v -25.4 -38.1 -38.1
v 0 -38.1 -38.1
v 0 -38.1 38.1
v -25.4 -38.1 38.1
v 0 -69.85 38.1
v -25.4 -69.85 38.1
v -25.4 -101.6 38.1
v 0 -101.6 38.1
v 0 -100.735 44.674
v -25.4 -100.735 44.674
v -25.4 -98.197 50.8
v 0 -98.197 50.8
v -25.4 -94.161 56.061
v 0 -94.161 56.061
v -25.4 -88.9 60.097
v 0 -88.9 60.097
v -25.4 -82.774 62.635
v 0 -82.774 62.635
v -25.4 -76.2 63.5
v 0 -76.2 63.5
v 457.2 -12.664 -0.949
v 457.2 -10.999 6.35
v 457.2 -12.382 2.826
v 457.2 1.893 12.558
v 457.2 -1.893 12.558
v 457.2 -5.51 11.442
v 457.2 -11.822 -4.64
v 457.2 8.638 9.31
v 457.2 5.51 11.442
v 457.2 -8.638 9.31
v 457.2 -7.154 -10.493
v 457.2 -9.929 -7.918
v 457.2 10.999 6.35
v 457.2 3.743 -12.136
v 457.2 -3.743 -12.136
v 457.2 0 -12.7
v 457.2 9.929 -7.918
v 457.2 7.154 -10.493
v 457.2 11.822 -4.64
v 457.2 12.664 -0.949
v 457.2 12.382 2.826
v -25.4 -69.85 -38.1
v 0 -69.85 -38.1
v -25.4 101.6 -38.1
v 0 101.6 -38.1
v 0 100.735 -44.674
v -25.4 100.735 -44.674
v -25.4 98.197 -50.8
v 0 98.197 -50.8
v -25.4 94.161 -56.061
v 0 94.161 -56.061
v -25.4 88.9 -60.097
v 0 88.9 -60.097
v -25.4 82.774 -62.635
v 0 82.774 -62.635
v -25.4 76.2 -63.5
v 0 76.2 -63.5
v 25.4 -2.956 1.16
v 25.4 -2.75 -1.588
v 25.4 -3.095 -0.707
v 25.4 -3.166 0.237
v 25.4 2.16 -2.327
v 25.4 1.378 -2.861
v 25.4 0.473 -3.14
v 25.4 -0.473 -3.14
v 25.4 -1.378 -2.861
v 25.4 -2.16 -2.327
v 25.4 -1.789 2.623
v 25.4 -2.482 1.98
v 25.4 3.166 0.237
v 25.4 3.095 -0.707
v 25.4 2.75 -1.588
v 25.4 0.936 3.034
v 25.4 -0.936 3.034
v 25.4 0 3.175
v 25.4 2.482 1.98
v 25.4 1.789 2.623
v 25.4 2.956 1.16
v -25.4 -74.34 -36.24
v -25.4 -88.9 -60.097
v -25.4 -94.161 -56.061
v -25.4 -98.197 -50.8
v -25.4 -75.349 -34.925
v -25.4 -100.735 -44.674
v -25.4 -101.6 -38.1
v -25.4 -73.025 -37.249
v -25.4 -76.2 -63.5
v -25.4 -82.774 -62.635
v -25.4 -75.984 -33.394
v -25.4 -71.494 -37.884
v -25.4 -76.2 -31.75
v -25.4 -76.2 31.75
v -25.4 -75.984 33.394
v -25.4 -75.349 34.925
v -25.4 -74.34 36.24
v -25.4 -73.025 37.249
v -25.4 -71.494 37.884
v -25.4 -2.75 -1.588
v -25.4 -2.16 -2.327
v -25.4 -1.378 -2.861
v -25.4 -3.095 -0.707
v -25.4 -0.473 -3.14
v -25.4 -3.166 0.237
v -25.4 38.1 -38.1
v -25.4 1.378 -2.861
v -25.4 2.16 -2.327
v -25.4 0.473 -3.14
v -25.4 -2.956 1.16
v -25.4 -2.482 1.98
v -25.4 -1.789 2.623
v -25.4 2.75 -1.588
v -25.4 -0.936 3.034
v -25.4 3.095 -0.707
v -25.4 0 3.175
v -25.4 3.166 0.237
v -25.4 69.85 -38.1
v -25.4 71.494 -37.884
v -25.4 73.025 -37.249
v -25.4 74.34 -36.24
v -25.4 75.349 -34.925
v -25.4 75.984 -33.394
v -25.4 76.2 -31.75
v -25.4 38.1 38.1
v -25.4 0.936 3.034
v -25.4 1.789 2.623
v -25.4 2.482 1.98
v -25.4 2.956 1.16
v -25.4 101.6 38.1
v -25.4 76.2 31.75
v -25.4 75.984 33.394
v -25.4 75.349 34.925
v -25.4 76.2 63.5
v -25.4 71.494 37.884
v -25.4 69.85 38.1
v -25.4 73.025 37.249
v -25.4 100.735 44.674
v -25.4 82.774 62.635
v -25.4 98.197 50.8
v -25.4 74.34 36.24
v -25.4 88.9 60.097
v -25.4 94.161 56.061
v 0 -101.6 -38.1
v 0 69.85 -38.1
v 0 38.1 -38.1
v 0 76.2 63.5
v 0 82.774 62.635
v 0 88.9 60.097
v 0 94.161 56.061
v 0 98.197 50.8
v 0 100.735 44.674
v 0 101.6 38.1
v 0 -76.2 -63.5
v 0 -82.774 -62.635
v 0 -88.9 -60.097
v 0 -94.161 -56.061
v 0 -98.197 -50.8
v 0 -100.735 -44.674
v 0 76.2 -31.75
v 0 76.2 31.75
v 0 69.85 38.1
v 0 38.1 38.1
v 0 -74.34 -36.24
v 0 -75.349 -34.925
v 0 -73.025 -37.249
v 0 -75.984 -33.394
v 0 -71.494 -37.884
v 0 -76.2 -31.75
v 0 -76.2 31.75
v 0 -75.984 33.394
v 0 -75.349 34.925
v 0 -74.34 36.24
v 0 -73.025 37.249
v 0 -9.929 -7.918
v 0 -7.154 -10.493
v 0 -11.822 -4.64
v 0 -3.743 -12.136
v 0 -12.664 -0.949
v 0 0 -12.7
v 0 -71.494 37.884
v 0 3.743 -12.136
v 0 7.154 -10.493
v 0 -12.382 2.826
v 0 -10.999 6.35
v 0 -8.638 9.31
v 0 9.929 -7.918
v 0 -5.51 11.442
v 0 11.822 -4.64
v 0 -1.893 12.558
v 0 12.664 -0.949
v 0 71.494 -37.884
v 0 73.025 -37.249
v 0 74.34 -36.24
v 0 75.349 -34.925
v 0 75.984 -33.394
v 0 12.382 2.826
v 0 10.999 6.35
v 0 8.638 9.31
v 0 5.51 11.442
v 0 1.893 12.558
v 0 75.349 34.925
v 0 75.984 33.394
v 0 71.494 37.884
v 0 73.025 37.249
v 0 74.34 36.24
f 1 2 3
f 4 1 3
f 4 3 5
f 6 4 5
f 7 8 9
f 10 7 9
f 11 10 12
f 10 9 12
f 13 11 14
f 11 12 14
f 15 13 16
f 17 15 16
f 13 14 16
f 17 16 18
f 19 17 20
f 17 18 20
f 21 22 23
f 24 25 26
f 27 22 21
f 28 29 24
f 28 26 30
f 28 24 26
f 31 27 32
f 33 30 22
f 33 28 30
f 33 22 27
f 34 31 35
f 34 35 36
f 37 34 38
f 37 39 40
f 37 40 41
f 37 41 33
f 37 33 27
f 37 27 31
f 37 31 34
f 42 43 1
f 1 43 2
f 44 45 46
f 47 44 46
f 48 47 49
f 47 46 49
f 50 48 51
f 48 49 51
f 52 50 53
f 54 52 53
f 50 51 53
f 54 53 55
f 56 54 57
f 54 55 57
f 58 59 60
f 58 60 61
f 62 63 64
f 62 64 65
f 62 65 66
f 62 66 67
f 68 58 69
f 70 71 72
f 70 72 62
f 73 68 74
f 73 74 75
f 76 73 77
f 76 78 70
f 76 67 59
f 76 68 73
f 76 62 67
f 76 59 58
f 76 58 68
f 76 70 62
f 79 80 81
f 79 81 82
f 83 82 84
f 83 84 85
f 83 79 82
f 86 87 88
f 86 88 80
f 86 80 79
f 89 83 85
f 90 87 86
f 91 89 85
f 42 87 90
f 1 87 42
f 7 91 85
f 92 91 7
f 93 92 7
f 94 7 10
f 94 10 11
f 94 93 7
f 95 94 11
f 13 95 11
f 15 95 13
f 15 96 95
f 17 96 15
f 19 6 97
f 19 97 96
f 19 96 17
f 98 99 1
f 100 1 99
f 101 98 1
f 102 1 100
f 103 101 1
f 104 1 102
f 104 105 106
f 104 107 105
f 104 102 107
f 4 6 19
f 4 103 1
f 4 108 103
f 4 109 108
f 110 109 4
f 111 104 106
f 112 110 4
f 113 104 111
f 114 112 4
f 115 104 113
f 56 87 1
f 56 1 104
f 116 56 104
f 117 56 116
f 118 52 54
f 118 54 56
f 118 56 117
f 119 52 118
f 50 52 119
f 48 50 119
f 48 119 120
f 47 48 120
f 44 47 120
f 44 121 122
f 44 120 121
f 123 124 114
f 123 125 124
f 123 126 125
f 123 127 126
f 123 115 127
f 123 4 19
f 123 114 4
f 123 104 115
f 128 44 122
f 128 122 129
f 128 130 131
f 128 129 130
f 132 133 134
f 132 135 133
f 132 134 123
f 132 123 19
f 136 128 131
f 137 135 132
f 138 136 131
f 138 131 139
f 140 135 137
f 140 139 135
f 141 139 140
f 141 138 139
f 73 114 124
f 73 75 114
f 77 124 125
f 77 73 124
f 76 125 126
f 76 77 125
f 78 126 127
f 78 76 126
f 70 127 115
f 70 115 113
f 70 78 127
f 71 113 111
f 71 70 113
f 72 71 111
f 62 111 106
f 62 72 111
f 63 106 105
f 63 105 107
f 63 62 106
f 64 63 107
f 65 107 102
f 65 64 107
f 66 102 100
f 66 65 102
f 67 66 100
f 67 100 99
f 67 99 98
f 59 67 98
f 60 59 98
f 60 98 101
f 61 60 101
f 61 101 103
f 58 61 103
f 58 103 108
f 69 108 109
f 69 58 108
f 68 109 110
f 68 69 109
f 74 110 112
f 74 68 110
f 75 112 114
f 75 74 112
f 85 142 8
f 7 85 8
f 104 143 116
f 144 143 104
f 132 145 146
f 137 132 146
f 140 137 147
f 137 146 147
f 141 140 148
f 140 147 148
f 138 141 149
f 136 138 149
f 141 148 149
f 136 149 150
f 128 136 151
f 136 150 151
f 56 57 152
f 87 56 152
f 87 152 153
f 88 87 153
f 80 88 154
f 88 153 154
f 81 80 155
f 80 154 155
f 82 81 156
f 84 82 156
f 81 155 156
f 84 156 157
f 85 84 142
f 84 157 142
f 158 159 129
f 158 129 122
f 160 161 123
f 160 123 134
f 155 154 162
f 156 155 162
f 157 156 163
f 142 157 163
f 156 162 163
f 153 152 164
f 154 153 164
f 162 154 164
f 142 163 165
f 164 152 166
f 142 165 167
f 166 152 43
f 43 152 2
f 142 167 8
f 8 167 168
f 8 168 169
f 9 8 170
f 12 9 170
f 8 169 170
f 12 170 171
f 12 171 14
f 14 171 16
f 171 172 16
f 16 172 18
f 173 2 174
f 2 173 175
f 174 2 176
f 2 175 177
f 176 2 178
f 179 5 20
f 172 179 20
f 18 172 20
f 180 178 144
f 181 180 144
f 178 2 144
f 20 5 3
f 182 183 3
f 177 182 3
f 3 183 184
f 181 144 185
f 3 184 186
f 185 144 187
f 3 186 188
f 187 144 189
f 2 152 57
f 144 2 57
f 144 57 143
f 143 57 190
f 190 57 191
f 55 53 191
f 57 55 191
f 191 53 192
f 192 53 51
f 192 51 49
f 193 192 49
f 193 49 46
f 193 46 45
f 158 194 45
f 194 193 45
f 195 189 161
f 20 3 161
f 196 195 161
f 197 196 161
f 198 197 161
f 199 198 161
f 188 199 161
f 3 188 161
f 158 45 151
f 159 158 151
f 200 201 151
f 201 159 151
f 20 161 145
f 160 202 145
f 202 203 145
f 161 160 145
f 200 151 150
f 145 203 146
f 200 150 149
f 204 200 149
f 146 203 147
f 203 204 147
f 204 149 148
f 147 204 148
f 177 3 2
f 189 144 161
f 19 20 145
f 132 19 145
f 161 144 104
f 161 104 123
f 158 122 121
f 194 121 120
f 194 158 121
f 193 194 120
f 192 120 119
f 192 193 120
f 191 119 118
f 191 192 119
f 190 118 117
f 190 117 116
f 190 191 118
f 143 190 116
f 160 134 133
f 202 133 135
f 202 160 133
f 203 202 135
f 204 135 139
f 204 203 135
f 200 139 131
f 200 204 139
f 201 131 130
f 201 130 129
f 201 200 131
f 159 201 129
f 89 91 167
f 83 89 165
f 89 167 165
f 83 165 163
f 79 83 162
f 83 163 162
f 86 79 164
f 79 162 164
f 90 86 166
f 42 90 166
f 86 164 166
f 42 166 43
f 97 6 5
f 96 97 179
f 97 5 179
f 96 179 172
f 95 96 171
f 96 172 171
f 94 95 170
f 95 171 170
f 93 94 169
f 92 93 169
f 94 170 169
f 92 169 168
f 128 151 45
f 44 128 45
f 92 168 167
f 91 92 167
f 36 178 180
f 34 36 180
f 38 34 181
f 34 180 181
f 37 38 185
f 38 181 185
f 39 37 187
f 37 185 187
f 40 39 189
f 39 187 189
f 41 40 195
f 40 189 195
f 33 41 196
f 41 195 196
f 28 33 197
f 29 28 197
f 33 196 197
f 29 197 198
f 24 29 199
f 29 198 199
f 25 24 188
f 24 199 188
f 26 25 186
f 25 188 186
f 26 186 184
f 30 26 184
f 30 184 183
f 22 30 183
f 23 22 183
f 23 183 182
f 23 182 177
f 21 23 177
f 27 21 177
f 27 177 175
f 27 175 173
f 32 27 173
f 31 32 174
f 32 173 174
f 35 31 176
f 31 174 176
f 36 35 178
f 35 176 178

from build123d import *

# Parameters (mm, degrees)
SKETCH1_R           = 12.7
BOSS_EXTRUDE1_DEPTH = 457.2
SKETCH2_R           = 3.175
BOSS_EXTRUDE2_DEPTH = 25.4
CUT_EXTRUDE1_START  = -50.8
SKETCH3_R           = 3.175
CUT_EXTRUDE1_DEPTH  = 50.8


with BuildPart() as part:
    # Sketch1 → Boss-Extrude1 (new body)
    with BuildSketch(Plane(origin=(0, 0, 0), x_dir=(0, 0, -1), z_dir=(1, 0, 0))):
        Circle(SKETCH1_R)
    extrude(amount=BOSS_EXTRUDE1_DEPTH)

    # Sketch2 → Boss-Extrude2 (add)
    with BuildSketch(Plane.ZY):
        with BuildLine():
            Line((-38.1, -101.6), (38.1, -101.6))
            ThreePointArc((38.1, -101.6), (56.060512242, -94.160512242), (63.5, -76.2))
            Line((63.5, -76.2), (63.5, 76.2))
            ThreePointArc((63.5, 76.2), (56.060512242, 94.160512242), (38.1, 101.6))
            Line((38.1, 101.6), (-38.1, 101.6))
            ThreePointArc((-38.1, 101.6), (-56.060512242, 94.160512242), (-63.5, 76.2))
            Line((-63.5, 76.2), (-63.5, -76.2))
            ThreePointArc((-63.5, -76.2), (-56.060512242, -94.160512242), (-38.1, -101.6))
        make_face()
        Circle(SKETCH2_R, mode=Mode.SUBTRACT)
        with BuildLine():
            Line((31.75, 76.2), (-31.75, 76.2))
            ThreePointArc((-31.75, 76.2), (-36.240128061, 74.340128061), (-38.1, 69.85))
            Line((-38.1, 69.85), (-38.1, 38.1))
            Line((-38.1, 38.1), (38.1, 38.1))
            Line((38.1, 38.1), (38.1, 69.85))
            ThreePointArc((38.1, 69.85), (36.240128061, 74.340128061), (31.75, 76.2))
        make_face(mode=Mode.SUBTRACT)
        with BuildLine():
            Line((31.75, -76.2), (-31.75, -76.2))
            ThreePointArc((-31.75, -76.2), (-36.240128061, -74.340128061), (-38.1, -69.85))
            Line((-38.1, -69.85), (-38.1, -38.1))
            Line((-38.1, -38.1), (38.1, -38.1))
            Line((38.1, -38.1), (38.1, -69.85))
            ThreePointArc((38.1, -69.85), (36.240128061, -74.340128061), (31.75, -76.2))
        make_face(mode=Mode.SUBTRACT)
    extrude(amount=BOSS_EXTRUDE2_DEPTH)

    # Sketch3 → Cut-Extrude1 (cut)
    with BuildSketch(Plane.ZY.offset(25.4).offset(CUT_EXTRUDE1_START)):
        Circle(SKETCH3_R)
    extrude(amount=CUT_EXTRUDE1_DEPTH, mode=Mode.SUBTRACT)


solid = part.part
